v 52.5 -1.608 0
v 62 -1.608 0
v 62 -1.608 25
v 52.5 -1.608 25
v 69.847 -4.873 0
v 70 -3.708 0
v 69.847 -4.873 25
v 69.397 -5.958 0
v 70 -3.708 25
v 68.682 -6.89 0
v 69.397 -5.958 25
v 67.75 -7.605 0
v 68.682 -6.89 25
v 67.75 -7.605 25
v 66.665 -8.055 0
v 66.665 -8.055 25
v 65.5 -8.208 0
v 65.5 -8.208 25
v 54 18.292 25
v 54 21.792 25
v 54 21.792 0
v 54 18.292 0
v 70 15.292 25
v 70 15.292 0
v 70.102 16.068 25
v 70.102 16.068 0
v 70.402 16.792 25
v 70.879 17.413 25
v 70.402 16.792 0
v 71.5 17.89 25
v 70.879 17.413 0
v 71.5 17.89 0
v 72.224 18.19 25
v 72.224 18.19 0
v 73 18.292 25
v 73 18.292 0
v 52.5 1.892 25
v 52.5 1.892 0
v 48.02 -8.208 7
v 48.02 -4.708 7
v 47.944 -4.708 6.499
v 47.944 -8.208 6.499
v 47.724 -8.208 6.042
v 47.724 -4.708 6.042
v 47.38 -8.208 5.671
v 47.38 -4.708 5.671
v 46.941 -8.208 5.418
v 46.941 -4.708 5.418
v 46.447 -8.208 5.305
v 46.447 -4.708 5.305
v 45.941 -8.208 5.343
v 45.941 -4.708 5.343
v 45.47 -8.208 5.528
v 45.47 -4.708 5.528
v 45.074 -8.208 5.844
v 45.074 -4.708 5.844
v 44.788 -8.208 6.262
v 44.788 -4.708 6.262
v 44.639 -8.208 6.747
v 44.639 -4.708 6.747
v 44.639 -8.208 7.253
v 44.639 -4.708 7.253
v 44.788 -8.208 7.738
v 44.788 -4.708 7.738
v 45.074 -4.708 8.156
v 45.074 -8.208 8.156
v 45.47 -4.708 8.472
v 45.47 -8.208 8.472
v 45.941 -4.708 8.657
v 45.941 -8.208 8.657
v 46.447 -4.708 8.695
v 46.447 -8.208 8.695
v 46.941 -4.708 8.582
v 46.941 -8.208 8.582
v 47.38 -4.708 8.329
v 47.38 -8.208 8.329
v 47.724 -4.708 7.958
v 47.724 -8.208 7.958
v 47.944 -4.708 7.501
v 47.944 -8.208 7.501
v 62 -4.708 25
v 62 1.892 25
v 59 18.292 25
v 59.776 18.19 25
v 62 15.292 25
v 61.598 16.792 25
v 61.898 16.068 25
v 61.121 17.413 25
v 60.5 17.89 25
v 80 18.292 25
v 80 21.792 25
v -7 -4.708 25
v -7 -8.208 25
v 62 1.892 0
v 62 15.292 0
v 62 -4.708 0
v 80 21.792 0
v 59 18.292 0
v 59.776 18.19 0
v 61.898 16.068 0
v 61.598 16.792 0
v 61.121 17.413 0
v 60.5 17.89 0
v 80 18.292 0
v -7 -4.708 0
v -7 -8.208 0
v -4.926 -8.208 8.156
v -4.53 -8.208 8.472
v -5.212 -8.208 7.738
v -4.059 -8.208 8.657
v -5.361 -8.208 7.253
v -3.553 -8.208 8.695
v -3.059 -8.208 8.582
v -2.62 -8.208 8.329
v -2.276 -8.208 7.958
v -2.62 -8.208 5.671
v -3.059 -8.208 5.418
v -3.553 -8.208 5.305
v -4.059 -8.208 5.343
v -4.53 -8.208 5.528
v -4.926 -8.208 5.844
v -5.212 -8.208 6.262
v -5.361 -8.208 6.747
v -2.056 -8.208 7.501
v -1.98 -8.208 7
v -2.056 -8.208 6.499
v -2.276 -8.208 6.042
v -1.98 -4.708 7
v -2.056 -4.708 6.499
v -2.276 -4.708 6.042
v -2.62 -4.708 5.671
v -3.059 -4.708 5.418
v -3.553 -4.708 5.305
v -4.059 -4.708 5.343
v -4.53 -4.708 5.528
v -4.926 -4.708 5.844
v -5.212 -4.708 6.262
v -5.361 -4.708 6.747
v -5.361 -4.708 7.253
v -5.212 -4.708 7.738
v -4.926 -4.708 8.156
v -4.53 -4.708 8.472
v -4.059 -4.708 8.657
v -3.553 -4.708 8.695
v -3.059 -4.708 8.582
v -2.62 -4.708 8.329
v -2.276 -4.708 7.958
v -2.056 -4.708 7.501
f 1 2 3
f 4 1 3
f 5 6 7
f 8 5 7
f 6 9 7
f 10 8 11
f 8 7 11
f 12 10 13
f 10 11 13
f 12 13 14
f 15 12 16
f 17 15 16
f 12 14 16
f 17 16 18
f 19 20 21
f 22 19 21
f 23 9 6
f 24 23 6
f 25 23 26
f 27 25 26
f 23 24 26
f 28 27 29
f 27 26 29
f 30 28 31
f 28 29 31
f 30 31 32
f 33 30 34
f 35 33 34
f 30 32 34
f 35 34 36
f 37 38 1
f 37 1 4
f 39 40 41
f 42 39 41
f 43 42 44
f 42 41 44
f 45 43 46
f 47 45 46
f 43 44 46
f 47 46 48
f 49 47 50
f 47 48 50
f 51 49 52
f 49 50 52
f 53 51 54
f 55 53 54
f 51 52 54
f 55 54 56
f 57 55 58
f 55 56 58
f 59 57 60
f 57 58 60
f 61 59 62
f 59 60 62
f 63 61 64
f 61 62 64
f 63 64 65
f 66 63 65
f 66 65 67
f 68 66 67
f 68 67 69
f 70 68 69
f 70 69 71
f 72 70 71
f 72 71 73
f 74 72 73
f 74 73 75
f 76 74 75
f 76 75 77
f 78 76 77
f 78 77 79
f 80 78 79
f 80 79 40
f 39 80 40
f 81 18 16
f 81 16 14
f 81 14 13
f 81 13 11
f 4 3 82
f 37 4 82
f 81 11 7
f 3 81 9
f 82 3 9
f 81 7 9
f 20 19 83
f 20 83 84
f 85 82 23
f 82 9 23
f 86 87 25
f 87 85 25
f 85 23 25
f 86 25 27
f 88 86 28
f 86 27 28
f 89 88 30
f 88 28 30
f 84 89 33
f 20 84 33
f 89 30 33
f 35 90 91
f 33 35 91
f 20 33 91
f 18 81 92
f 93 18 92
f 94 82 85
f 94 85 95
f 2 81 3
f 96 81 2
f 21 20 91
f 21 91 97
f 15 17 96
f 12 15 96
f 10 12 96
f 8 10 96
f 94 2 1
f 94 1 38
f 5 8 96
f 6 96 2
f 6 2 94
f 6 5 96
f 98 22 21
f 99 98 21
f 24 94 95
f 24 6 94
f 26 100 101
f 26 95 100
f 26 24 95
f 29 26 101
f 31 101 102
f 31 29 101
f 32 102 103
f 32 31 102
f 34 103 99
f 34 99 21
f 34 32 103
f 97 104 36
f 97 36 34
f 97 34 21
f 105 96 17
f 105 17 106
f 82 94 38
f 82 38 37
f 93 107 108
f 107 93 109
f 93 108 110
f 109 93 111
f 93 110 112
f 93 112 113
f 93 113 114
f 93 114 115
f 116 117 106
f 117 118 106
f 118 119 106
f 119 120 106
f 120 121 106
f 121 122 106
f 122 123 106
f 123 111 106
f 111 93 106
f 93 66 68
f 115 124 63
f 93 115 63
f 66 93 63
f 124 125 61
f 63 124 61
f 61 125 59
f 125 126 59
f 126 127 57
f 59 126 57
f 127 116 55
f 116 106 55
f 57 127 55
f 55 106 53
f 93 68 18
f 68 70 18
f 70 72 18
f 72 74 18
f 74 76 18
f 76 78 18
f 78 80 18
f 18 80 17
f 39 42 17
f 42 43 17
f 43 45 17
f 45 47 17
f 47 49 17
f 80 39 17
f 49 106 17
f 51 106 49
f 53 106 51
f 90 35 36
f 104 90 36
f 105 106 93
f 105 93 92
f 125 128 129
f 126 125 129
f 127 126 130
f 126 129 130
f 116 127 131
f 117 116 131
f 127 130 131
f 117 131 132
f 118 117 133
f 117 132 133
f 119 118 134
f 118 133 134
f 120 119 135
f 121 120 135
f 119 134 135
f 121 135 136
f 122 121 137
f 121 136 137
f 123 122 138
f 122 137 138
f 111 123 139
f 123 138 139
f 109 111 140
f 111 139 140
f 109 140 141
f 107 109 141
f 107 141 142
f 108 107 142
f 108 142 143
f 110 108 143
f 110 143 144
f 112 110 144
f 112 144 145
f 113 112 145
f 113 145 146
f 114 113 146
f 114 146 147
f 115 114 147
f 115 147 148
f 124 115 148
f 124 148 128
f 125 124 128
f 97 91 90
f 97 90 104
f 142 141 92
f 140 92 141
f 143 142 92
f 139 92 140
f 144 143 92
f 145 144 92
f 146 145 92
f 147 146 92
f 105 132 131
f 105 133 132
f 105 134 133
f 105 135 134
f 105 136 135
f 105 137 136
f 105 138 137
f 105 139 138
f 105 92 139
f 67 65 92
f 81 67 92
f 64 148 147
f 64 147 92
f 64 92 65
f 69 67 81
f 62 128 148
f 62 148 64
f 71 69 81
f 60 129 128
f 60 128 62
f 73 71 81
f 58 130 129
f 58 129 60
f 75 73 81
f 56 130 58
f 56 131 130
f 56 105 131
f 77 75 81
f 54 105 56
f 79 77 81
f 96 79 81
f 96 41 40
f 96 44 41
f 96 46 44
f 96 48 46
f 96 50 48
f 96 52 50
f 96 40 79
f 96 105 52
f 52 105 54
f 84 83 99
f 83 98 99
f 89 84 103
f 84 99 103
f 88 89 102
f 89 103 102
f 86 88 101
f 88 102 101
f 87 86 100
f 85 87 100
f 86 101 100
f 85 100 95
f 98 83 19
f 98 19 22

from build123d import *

# Parameters (mm, degrees)
SCHIZZO1_W                        = 77
SCHIZZO1_H                        = 3.5
ESTRUSIONE_ESTRUSIONE1_DEPTH      = 25
SCHIZZO2_W                        = 8
SCHIZZO2_H                        = 25
ESTRUSIONE_ESTRUSIONE2_DEPTH      = 23
SCHIZZO3_W                        = 25
SCHIZZO3_H                        = 3.5
ESTRUSIONE_ESTRUSIONE3_DEPTH      = 9.5
SCHIZZO4_W                        = 25
SCHIZZO4_H                        = 3.5
ESTRUSIONE_ESTRUSIONE4_DEPTH      = 10
ESTRUSIONE_ESTRUSIONE4_DEPTH_BACK = 16
SCHIZZO5_R                        = 1.7
TAGLIO_ESTRUSIONE1_DEPTH          = 8
RACCORDO2_R                       = 4.5
RACCORDO3_R                       = 3
RACCORDO5_R                       = 3


with BuildPart() as part:
    # Schizzo1 → Estrusione-Estrusione1 (new body)
    with BuildSketch(Plane.XY):
        with Locations((31.5, -6.45807022)):
            Rectangle(SCHIZZO1_W, SCHIZZO1_H)
    extrude(amount=ESTRUSIONE_ESTRUSIONE1_DEPTH)

    # Schizzo2 → Estrusione-Estrusione2 (add)
    with BuildSketch(Plane(origin=(0, -4.70807022, 0), x_dir=(1, 0, 0), z_dir=(0, 1, 0))):
        with Locations((66, -12.5)):
            Rectangle(SCHIZZO2_W, SCHIZZO2_H)
    extrude(amount=ESTRUSIONE_ESTRUSIONE2_DEPTH)

    # Schizzo3 → Estrusione-Estrusione3 (add)
    with BuildSketch(Plane.ZY.offset(-62)):
        with Locations((12.5, 0.14192978)):
            Rectangle(SCHIZZO3_W, SCHIZZO3_H)
    extrude(amount=ESTRUSIONE_ESTRUSIONE3_DEPTH)

    # Schizzo4 → Estrusione-Estrusione4 (add, two sides)
    with BuildSketch(Plane(origin=(70, 0, 0), x_dir=(0, 0, -1), z_dir=(1, 0, 0))) as estrusione_estrusione4_sk:
        with Locations((-12.5, 20.04192978)):
            Rectangle(SCHIZZO4_W, SCHIZZO4_H)
    extrude(amount=ESTRUSIONE_ESTRUSIONE4_DEPTH)
    extrude(estrusione_estrusione4_sk.sketch, amount=-ESTRUSIONE_ESTRUSIONE4_DEPTH_BACK)

    # Schizzo5 → Taglio-Estrusione1 (cut)
    with BuildSketch(Plane(origin=(0, -4.70807022, 0), x_dir=(1, 0, 0), z_dir=(0, 1, 0))):
        with Locations((46.319751134, -7)):
            Circle(SCHIZZO5_R)
        with Locations((-3.680248866, -7)):
            Circle(SCHIZZO5_R)
    extrude(amount=-TAGLIO_ESTRUSIONE1_DEPTH, mode=Mode.SUBTRACT)

    # Raccordo2
    raccordo2_edges = [part.edges().sort_by_distance(p)[0] for p in [
        (70, -8.20807022, 12.5),
    ]]
    fillet(raccordo2_edges, radius=RACCORDO2_R)

    # Raccordo3
    raccordo3_edges = [part.edges().sort_by_distance(p)[0] for p in [
        (70, 18.29192978, 12.5),
    ]]
    fillet(raccordo3_edges, radius=RACCORDO3_R)

    # Raccordo5
    raccordo5_edges = [part.edges().sort_by_distance(p)[0] for p in [
        (62, 18.29192978, 12.5),
    ]]
    fillet(raccordo5_edges, radius=RACCORDO5_R)


solid = part.part
